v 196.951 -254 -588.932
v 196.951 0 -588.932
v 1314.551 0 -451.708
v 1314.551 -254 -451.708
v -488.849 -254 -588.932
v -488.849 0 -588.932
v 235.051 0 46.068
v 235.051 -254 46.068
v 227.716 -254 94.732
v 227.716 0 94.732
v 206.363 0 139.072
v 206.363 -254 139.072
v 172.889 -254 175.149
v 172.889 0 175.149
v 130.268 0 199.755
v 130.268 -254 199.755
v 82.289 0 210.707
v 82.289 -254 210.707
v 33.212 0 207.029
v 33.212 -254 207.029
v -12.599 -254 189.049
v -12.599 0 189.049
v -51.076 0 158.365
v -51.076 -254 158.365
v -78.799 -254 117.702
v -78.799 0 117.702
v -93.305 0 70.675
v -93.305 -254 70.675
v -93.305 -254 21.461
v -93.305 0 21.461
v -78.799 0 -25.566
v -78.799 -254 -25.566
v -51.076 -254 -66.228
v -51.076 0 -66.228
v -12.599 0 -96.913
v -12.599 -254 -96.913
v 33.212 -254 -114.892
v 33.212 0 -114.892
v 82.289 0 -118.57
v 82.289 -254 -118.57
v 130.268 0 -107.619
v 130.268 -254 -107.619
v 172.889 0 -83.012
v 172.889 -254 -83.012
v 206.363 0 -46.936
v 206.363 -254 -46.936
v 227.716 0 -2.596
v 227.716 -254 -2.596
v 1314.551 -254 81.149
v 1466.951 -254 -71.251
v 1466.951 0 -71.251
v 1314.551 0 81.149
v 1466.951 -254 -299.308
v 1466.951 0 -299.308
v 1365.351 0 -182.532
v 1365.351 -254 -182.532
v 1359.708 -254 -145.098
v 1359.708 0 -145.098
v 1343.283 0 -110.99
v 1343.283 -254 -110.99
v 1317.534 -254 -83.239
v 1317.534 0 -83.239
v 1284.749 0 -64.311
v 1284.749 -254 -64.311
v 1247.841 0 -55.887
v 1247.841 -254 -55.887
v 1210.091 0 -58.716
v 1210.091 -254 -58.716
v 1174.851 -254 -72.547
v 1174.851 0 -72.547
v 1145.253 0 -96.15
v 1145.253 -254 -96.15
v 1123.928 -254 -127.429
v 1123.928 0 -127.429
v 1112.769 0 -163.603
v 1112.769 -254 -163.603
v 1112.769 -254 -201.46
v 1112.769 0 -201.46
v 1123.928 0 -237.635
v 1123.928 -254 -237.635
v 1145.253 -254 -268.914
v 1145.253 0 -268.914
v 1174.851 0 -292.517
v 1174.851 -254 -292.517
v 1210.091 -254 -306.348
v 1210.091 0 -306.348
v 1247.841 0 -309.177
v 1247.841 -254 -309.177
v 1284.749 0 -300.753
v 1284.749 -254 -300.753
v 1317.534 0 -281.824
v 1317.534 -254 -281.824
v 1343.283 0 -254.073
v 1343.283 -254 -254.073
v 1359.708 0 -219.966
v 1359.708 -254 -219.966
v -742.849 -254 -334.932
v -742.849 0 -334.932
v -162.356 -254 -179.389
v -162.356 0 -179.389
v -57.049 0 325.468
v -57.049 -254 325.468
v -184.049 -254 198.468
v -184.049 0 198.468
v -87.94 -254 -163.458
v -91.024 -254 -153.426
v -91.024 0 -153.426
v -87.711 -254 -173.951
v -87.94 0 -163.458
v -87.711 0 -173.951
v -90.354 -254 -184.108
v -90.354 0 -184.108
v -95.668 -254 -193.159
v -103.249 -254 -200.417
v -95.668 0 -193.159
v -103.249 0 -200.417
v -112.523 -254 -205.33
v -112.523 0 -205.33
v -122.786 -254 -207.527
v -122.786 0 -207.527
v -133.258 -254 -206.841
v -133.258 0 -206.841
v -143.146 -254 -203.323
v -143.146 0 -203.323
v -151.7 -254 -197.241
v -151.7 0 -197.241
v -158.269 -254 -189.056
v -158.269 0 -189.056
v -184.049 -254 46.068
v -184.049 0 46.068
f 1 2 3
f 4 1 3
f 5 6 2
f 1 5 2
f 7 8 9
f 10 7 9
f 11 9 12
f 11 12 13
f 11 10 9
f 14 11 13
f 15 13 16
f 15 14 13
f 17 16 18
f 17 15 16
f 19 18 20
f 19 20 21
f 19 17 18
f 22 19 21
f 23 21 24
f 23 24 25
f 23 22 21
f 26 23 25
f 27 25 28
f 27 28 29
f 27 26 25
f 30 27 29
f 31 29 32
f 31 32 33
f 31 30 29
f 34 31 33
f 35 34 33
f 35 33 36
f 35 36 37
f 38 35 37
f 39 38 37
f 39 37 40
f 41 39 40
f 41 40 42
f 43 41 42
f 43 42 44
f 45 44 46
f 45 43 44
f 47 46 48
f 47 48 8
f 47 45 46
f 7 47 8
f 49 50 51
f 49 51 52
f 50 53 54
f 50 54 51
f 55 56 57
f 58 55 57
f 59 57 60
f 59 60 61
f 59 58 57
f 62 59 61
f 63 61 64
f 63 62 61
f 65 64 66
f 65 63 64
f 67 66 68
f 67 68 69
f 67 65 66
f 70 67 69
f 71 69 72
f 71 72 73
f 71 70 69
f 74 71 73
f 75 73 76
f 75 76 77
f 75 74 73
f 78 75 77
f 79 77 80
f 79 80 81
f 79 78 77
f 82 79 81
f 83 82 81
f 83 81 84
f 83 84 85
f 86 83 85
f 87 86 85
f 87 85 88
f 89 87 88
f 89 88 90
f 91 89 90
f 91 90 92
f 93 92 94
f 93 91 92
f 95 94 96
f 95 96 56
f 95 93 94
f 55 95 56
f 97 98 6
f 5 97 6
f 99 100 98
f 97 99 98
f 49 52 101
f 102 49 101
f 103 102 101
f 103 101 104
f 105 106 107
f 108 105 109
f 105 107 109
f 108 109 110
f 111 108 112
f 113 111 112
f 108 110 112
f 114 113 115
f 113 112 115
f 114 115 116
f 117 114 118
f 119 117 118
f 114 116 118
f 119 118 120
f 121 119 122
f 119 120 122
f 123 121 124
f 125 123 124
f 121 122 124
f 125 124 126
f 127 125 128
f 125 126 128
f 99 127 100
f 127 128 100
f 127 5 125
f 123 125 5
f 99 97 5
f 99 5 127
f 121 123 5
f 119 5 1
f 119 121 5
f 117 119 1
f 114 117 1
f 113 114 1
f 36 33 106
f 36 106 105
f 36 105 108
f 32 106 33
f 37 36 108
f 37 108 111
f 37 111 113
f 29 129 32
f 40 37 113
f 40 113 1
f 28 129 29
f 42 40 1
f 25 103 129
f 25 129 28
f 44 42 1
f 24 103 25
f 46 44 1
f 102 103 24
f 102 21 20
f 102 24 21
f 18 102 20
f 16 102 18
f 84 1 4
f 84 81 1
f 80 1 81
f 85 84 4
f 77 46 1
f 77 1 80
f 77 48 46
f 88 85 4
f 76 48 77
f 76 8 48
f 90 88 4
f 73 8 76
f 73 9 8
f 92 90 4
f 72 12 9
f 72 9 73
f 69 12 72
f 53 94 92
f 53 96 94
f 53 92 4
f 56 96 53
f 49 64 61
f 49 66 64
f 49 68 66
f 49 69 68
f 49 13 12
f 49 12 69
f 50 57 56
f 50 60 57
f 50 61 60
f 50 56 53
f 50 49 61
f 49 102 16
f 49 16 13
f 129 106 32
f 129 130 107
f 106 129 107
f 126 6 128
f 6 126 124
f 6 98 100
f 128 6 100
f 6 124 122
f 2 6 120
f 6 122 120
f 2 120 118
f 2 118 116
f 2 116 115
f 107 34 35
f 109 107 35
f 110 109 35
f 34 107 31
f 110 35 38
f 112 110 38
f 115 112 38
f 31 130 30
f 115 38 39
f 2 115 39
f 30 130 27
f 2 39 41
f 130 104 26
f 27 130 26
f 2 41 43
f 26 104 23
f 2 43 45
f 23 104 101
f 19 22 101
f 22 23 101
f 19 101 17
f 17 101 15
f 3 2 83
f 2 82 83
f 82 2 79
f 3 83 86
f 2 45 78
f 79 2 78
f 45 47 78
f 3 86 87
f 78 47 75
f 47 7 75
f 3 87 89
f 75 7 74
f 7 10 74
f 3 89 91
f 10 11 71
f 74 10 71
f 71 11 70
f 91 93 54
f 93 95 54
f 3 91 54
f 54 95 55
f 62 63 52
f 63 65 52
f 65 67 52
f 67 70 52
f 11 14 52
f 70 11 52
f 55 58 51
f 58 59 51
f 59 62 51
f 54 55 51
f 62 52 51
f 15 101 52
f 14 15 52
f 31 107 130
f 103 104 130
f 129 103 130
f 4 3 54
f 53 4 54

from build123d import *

# Parameters (mm, degrees)
F0_R     = 127
F0_R_2   = 165.1
F1_DEPTH = 254


# Not quite as in the source:
# - ends of sketch curves that miss each other by under 0.0002 mm in the source are joined


with BuildPart() as f1:
    # F0 (on Front) → F1 (new body)
    with BuildSketch(Plane.XZ):
        with BuildLine():
            Line((1314.5506856, -451.7077834), (1466.9506856, -299.3077834))
            Line((1466.9506856, -299.3077834), (1466.9506856, -71.2509878))
            Line((1466.9506856, -71.2509878), (1314.5506856, 81.1490122))
            Line((1314.5506856, 81.1490122), (-57.0493144, 325.4681832))
            Line((-57.0493144, 325.4681832), (-184.0493144, 198.4681832))
            Line((-184.0493144, 198.4681832), (-184.0493144, 46.0681832))
            Line((-184.0493144, 46.0681832), (-91.0235416, -153.4262362))
            ThreePointArc((-91.0235416, -153.4262362), (-112.5228808858, -205.3302952862), (-162.3556290296, -179.3889979113))
            Line((-162.3556290296, -179.3889979113), (-742.8493144, -334.9318168))
            Line((-742.8493144, -334.9318168), (-488.8493144, -588.9318168))
            Line((-488.8493144, -588.9318168), (196.9506856, -588.9318168))
            Line((196.9506856, -588.9318168), (1314.5506856, -451.7077834))
        make_face()
        with Locations((1238.3506856, -182.5318168)):
            Circle(F0_R, mode=Mode.SUBTRACT)
        with Locations((69.9506856, 46.0681832)):
            Circle(F0_R_2, mode=Mode.SUBTRACT)
    extrude(amount=F1_DEPTH)


solid = f1.part
